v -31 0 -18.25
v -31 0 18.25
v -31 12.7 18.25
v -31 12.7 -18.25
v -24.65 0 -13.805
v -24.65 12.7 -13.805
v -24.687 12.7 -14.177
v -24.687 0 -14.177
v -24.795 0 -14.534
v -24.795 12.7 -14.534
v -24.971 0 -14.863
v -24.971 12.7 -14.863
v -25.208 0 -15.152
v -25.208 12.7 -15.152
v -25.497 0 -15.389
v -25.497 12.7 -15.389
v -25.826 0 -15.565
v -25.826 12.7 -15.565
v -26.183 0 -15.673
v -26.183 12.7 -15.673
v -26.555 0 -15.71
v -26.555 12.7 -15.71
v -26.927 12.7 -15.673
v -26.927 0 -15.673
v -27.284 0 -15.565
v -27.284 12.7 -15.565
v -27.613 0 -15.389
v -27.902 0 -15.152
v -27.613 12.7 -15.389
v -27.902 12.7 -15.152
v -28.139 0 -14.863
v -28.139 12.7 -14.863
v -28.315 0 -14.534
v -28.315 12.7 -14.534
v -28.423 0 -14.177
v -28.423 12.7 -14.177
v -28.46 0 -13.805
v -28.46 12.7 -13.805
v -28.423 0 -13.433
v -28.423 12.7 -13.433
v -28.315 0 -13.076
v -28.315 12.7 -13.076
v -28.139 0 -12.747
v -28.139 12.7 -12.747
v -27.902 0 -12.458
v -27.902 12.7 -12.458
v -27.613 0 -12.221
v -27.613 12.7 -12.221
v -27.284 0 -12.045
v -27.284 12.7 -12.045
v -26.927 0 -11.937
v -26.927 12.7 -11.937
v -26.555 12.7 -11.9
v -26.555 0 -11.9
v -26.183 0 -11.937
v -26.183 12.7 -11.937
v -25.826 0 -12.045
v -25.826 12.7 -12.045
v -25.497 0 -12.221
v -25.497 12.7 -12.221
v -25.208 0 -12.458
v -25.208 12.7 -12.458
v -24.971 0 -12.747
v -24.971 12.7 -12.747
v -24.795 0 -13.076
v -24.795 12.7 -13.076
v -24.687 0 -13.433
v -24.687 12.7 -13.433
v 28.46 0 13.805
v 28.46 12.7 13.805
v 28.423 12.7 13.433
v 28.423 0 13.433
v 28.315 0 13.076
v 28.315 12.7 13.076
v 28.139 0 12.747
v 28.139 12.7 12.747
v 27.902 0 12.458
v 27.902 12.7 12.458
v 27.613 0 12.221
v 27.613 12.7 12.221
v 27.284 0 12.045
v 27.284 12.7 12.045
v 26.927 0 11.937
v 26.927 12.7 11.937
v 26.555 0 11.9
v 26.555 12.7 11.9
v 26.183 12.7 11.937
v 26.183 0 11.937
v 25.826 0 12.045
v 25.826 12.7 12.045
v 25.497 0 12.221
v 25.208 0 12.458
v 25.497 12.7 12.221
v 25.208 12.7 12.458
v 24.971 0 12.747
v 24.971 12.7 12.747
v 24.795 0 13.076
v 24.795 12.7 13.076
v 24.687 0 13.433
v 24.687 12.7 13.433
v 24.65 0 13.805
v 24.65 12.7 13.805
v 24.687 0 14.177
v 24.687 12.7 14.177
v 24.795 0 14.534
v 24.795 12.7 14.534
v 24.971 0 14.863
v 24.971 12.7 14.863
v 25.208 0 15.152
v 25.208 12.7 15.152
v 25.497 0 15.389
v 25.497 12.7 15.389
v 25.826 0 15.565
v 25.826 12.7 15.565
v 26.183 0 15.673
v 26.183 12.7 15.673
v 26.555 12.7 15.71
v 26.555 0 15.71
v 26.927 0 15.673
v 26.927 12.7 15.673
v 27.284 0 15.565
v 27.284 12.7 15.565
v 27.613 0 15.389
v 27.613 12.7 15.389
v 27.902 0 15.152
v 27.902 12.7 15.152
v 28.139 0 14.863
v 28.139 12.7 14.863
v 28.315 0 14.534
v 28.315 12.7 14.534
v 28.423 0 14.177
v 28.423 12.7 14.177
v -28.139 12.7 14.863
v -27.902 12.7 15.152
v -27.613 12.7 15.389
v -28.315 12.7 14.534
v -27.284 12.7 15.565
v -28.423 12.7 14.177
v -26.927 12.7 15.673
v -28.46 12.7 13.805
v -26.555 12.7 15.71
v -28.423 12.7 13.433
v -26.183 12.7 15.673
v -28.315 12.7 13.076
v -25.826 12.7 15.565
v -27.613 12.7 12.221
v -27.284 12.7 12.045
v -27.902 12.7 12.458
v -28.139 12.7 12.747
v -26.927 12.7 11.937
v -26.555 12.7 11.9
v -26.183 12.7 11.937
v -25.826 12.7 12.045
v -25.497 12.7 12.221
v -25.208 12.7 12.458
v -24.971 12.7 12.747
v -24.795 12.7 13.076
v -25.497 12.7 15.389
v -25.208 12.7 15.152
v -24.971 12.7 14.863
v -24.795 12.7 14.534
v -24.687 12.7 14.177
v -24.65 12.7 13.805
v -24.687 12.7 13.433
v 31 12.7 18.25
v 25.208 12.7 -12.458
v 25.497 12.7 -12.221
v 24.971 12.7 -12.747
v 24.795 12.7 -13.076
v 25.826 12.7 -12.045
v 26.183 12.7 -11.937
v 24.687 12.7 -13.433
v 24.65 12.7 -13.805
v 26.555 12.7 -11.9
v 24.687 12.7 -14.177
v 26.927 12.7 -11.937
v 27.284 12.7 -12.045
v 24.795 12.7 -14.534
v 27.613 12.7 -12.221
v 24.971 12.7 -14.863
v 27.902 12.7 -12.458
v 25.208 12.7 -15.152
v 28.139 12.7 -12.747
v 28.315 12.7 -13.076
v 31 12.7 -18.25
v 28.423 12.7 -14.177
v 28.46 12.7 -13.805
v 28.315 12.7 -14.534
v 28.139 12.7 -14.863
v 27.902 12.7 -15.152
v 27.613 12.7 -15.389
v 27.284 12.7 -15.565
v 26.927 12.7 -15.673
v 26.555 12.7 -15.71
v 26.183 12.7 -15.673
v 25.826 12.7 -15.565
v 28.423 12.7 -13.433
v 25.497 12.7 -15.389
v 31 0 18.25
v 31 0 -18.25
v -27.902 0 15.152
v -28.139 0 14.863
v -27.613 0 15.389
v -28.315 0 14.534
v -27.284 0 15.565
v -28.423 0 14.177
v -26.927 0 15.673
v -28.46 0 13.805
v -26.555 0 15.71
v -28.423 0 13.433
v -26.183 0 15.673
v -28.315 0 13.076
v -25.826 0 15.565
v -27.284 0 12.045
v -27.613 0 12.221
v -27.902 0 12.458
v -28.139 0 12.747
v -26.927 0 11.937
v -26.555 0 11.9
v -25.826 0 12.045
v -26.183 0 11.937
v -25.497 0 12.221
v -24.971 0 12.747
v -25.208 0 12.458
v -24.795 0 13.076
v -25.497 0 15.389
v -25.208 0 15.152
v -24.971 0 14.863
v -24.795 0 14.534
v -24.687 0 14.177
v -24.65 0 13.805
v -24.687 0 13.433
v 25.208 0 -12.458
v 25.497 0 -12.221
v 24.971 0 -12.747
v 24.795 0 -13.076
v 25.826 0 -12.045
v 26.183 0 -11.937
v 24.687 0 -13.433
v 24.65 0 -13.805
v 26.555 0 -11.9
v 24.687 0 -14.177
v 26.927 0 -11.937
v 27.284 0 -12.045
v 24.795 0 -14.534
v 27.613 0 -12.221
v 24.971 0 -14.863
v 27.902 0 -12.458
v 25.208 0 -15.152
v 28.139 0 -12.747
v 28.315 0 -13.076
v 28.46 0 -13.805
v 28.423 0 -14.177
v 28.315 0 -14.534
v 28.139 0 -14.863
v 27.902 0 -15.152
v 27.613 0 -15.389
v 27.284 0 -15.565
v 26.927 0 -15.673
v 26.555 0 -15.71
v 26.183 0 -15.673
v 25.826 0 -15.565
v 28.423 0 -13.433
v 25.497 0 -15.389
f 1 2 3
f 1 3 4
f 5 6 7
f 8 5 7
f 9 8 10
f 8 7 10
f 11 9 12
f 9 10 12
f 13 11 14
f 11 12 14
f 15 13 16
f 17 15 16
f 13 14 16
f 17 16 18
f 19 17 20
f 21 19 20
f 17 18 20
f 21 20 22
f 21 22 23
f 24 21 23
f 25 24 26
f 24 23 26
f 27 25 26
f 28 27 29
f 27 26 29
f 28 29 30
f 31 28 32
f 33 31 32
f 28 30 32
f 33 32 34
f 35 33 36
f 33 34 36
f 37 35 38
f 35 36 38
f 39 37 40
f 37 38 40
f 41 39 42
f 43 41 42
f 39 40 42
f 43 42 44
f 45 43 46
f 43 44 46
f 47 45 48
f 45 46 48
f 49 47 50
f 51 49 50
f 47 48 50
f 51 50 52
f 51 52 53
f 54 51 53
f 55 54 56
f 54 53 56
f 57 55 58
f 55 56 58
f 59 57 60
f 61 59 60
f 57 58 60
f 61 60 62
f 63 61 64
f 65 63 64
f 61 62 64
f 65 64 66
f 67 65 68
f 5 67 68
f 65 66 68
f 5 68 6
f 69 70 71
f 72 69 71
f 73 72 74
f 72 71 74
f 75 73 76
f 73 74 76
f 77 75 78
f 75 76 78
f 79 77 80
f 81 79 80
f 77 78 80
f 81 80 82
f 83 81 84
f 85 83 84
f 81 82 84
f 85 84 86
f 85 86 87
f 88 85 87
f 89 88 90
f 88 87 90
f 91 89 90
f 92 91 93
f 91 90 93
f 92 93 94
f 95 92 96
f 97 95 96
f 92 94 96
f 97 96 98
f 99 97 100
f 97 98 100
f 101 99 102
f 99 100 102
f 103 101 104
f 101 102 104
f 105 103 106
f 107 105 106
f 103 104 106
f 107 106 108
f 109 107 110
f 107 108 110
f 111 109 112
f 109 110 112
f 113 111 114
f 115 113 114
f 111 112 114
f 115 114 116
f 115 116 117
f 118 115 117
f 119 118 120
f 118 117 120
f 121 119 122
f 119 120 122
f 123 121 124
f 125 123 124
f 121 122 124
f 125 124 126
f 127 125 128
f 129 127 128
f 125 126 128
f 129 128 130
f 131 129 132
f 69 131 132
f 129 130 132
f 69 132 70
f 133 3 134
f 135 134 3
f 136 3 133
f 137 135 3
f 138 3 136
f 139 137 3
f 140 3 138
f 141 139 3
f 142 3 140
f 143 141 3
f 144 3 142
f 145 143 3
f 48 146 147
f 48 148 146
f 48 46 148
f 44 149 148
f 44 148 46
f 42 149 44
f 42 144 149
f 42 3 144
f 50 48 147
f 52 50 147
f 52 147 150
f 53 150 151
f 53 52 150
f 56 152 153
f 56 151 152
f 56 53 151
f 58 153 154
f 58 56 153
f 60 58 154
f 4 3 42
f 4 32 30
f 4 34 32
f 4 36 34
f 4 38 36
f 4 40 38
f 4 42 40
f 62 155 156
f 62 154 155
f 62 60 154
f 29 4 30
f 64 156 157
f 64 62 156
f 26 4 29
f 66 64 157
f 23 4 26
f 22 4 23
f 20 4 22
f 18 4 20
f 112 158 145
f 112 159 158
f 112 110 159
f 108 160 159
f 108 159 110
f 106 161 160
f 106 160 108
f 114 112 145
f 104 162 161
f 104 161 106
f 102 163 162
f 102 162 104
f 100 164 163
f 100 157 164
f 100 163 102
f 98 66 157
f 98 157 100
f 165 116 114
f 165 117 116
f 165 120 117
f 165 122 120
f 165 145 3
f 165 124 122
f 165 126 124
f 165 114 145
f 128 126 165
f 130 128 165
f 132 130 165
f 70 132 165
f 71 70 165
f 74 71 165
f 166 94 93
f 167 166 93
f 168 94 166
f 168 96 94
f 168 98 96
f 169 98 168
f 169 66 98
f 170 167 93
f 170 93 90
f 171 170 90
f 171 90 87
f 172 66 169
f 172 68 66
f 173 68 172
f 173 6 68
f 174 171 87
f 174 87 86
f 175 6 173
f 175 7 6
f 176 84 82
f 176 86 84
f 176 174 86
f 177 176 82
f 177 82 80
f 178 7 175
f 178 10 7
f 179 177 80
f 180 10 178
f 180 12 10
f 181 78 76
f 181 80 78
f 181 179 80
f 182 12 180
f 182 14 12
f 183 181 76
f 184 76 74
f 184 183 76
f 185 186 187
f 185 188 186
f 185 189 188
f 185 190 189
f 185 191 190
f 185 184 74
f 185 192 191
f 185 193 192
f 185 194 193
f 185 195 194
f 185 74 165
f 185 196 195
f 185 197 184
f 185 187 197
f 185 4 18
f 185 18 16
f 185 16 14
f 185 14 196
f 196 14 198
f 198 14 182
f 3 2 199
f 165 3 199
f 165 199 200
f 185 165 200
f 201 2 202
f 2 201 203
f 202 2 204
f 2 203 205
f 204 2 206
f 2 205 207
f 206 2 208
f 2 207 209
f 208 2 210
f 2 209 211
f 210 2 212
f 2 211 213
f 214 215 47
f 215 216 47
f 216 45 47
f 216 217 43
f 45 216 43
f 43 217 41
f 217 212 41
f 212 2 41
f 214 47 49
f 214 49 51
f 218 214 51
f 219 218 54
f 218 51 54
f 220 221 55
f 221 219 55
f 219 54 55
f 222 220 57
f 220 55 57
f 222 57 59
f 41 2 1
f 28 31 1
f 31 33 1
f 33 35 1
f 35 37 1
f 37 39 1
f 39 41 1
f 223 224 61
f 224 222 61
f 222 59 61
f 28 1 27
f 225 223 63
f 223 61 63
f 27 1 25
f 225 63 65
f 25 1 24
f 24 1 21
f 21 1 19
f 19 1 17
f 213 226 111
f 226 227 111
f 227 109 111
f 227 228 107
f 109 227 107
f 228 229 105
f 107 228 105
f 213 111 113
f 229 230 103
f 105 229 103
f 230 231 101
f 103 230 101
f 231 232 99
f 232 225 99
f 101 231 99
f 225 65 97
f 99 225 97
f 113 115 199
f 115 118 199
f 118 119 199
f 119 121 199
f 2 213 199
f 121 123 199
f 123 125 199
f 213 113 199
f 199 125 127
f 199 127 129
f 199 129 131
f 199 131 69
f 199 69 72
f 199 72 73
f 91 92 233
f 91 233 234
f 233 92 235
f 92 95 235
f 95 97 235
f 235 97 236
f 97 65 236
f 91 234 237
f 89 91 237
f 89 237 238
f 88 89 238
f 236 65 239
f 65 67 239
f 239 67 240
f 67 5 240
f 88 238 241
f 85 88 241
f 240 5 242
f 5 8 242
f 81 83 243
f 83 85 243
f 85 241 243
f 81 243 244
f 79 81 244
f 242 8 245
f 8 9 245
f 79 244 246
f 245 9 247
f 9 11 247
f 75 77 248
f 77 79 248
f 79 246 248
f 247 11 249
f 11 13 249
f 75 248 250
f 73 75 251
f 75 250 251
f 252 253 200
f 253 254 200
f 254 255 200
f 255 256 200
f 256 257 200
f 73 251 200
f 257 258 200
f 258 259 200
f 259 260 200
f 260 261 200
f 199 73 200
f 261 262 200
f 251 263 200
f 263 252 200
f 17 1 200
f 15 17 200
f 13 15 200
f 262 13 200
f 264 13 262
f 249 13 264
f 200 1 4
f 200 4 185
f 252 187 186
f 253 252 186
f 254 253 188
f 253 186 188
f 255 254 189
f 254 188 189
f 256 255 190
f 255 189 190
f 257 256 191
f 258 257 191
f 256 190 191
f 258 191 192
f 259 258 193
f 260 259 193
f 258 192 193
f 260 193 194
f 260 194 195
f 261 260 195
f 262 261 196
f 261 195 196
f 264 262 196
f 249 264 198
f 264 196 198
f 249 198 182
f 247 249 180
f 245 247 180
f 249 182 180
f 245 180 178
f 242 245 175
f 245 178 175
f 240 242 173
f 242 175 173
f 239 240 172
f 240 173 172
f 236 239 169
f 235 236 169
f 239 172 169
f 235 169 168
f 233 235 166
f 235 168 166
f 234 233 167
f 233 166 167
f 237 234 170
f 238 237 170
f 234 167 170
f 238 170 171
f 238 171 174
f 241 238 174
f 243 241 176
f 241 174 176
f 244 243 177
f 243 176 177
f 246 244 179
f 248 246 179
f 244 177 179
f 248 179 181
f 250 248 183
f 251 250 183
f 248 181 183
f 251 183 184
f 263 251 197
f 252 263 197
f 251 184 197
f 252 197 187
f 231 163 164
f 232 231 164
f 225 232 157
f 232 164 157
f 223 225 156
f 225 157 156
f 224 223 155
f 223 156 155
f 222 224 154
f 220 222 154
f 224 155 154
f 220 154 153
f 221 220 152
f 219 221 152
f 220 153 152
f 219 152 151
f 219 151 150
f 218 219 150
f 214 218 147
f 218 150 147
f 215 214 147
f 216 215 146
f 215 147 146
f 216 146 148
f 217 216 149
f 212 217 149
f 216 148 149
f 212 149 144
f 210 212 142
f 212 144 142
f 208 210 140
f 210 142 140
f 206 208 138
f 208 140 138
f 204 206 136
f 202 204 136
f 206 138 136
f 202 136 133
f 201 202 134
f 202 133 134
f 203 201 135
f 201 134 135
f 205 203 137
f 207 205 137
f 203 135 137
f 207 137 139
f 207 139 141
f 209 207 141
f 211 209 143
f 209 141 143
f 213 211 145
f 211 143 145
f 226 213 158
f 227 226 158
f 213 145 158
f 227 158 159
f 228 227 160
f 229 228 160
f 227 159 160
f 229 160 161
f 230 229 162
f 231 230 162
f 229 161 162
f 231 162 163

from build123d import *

# Parameters (mm, degrees)
SKETCH1_W           = 62
SKETCH1_H           = 36.5
BOSS_EXTRUDE1_DEPTH = 12.7
SKETCH2_R           = 1.905
CUT_EXTRUDE1_DEPTH  = 12.7


with BuildPart() as part:
    # Sketch1 → Boss-Extrude1 (new body)
    with BuildSketch(Plane(origin=(0, 0, 0), x_dir=(1, 0, 0), z_dir=(0, 1, 0))):
        Rectangle(SKETCH1_W, SKETCH1_H)
    extrude(amount=BOSS_EXTRUDE1_DEPTH)

    # Sketch2 → Cut-Extrude1 (cut)
    with BuildSketch(Plane(origin=(0, 12.7, 0), x_dir=(1, 0, 0), z_dir=(0, 1, 0))):
        with Locations((26.555, 13.805)):
            Circle(SKETCH2_R)
        with Locations((26.555, -13.805)):
            Circle(SKETCH2_R)
        with Locations((-26.555, 13.805)):
            Circle(SKETCH2_R)
        with Locations((-26.555, -13.805)):
            Circle(SKETCH2_R)
    extrude(amount=-CUT_EXTRUDE1_DEPTH, mode=Mode.SUBTRACT)


solid = part.part
